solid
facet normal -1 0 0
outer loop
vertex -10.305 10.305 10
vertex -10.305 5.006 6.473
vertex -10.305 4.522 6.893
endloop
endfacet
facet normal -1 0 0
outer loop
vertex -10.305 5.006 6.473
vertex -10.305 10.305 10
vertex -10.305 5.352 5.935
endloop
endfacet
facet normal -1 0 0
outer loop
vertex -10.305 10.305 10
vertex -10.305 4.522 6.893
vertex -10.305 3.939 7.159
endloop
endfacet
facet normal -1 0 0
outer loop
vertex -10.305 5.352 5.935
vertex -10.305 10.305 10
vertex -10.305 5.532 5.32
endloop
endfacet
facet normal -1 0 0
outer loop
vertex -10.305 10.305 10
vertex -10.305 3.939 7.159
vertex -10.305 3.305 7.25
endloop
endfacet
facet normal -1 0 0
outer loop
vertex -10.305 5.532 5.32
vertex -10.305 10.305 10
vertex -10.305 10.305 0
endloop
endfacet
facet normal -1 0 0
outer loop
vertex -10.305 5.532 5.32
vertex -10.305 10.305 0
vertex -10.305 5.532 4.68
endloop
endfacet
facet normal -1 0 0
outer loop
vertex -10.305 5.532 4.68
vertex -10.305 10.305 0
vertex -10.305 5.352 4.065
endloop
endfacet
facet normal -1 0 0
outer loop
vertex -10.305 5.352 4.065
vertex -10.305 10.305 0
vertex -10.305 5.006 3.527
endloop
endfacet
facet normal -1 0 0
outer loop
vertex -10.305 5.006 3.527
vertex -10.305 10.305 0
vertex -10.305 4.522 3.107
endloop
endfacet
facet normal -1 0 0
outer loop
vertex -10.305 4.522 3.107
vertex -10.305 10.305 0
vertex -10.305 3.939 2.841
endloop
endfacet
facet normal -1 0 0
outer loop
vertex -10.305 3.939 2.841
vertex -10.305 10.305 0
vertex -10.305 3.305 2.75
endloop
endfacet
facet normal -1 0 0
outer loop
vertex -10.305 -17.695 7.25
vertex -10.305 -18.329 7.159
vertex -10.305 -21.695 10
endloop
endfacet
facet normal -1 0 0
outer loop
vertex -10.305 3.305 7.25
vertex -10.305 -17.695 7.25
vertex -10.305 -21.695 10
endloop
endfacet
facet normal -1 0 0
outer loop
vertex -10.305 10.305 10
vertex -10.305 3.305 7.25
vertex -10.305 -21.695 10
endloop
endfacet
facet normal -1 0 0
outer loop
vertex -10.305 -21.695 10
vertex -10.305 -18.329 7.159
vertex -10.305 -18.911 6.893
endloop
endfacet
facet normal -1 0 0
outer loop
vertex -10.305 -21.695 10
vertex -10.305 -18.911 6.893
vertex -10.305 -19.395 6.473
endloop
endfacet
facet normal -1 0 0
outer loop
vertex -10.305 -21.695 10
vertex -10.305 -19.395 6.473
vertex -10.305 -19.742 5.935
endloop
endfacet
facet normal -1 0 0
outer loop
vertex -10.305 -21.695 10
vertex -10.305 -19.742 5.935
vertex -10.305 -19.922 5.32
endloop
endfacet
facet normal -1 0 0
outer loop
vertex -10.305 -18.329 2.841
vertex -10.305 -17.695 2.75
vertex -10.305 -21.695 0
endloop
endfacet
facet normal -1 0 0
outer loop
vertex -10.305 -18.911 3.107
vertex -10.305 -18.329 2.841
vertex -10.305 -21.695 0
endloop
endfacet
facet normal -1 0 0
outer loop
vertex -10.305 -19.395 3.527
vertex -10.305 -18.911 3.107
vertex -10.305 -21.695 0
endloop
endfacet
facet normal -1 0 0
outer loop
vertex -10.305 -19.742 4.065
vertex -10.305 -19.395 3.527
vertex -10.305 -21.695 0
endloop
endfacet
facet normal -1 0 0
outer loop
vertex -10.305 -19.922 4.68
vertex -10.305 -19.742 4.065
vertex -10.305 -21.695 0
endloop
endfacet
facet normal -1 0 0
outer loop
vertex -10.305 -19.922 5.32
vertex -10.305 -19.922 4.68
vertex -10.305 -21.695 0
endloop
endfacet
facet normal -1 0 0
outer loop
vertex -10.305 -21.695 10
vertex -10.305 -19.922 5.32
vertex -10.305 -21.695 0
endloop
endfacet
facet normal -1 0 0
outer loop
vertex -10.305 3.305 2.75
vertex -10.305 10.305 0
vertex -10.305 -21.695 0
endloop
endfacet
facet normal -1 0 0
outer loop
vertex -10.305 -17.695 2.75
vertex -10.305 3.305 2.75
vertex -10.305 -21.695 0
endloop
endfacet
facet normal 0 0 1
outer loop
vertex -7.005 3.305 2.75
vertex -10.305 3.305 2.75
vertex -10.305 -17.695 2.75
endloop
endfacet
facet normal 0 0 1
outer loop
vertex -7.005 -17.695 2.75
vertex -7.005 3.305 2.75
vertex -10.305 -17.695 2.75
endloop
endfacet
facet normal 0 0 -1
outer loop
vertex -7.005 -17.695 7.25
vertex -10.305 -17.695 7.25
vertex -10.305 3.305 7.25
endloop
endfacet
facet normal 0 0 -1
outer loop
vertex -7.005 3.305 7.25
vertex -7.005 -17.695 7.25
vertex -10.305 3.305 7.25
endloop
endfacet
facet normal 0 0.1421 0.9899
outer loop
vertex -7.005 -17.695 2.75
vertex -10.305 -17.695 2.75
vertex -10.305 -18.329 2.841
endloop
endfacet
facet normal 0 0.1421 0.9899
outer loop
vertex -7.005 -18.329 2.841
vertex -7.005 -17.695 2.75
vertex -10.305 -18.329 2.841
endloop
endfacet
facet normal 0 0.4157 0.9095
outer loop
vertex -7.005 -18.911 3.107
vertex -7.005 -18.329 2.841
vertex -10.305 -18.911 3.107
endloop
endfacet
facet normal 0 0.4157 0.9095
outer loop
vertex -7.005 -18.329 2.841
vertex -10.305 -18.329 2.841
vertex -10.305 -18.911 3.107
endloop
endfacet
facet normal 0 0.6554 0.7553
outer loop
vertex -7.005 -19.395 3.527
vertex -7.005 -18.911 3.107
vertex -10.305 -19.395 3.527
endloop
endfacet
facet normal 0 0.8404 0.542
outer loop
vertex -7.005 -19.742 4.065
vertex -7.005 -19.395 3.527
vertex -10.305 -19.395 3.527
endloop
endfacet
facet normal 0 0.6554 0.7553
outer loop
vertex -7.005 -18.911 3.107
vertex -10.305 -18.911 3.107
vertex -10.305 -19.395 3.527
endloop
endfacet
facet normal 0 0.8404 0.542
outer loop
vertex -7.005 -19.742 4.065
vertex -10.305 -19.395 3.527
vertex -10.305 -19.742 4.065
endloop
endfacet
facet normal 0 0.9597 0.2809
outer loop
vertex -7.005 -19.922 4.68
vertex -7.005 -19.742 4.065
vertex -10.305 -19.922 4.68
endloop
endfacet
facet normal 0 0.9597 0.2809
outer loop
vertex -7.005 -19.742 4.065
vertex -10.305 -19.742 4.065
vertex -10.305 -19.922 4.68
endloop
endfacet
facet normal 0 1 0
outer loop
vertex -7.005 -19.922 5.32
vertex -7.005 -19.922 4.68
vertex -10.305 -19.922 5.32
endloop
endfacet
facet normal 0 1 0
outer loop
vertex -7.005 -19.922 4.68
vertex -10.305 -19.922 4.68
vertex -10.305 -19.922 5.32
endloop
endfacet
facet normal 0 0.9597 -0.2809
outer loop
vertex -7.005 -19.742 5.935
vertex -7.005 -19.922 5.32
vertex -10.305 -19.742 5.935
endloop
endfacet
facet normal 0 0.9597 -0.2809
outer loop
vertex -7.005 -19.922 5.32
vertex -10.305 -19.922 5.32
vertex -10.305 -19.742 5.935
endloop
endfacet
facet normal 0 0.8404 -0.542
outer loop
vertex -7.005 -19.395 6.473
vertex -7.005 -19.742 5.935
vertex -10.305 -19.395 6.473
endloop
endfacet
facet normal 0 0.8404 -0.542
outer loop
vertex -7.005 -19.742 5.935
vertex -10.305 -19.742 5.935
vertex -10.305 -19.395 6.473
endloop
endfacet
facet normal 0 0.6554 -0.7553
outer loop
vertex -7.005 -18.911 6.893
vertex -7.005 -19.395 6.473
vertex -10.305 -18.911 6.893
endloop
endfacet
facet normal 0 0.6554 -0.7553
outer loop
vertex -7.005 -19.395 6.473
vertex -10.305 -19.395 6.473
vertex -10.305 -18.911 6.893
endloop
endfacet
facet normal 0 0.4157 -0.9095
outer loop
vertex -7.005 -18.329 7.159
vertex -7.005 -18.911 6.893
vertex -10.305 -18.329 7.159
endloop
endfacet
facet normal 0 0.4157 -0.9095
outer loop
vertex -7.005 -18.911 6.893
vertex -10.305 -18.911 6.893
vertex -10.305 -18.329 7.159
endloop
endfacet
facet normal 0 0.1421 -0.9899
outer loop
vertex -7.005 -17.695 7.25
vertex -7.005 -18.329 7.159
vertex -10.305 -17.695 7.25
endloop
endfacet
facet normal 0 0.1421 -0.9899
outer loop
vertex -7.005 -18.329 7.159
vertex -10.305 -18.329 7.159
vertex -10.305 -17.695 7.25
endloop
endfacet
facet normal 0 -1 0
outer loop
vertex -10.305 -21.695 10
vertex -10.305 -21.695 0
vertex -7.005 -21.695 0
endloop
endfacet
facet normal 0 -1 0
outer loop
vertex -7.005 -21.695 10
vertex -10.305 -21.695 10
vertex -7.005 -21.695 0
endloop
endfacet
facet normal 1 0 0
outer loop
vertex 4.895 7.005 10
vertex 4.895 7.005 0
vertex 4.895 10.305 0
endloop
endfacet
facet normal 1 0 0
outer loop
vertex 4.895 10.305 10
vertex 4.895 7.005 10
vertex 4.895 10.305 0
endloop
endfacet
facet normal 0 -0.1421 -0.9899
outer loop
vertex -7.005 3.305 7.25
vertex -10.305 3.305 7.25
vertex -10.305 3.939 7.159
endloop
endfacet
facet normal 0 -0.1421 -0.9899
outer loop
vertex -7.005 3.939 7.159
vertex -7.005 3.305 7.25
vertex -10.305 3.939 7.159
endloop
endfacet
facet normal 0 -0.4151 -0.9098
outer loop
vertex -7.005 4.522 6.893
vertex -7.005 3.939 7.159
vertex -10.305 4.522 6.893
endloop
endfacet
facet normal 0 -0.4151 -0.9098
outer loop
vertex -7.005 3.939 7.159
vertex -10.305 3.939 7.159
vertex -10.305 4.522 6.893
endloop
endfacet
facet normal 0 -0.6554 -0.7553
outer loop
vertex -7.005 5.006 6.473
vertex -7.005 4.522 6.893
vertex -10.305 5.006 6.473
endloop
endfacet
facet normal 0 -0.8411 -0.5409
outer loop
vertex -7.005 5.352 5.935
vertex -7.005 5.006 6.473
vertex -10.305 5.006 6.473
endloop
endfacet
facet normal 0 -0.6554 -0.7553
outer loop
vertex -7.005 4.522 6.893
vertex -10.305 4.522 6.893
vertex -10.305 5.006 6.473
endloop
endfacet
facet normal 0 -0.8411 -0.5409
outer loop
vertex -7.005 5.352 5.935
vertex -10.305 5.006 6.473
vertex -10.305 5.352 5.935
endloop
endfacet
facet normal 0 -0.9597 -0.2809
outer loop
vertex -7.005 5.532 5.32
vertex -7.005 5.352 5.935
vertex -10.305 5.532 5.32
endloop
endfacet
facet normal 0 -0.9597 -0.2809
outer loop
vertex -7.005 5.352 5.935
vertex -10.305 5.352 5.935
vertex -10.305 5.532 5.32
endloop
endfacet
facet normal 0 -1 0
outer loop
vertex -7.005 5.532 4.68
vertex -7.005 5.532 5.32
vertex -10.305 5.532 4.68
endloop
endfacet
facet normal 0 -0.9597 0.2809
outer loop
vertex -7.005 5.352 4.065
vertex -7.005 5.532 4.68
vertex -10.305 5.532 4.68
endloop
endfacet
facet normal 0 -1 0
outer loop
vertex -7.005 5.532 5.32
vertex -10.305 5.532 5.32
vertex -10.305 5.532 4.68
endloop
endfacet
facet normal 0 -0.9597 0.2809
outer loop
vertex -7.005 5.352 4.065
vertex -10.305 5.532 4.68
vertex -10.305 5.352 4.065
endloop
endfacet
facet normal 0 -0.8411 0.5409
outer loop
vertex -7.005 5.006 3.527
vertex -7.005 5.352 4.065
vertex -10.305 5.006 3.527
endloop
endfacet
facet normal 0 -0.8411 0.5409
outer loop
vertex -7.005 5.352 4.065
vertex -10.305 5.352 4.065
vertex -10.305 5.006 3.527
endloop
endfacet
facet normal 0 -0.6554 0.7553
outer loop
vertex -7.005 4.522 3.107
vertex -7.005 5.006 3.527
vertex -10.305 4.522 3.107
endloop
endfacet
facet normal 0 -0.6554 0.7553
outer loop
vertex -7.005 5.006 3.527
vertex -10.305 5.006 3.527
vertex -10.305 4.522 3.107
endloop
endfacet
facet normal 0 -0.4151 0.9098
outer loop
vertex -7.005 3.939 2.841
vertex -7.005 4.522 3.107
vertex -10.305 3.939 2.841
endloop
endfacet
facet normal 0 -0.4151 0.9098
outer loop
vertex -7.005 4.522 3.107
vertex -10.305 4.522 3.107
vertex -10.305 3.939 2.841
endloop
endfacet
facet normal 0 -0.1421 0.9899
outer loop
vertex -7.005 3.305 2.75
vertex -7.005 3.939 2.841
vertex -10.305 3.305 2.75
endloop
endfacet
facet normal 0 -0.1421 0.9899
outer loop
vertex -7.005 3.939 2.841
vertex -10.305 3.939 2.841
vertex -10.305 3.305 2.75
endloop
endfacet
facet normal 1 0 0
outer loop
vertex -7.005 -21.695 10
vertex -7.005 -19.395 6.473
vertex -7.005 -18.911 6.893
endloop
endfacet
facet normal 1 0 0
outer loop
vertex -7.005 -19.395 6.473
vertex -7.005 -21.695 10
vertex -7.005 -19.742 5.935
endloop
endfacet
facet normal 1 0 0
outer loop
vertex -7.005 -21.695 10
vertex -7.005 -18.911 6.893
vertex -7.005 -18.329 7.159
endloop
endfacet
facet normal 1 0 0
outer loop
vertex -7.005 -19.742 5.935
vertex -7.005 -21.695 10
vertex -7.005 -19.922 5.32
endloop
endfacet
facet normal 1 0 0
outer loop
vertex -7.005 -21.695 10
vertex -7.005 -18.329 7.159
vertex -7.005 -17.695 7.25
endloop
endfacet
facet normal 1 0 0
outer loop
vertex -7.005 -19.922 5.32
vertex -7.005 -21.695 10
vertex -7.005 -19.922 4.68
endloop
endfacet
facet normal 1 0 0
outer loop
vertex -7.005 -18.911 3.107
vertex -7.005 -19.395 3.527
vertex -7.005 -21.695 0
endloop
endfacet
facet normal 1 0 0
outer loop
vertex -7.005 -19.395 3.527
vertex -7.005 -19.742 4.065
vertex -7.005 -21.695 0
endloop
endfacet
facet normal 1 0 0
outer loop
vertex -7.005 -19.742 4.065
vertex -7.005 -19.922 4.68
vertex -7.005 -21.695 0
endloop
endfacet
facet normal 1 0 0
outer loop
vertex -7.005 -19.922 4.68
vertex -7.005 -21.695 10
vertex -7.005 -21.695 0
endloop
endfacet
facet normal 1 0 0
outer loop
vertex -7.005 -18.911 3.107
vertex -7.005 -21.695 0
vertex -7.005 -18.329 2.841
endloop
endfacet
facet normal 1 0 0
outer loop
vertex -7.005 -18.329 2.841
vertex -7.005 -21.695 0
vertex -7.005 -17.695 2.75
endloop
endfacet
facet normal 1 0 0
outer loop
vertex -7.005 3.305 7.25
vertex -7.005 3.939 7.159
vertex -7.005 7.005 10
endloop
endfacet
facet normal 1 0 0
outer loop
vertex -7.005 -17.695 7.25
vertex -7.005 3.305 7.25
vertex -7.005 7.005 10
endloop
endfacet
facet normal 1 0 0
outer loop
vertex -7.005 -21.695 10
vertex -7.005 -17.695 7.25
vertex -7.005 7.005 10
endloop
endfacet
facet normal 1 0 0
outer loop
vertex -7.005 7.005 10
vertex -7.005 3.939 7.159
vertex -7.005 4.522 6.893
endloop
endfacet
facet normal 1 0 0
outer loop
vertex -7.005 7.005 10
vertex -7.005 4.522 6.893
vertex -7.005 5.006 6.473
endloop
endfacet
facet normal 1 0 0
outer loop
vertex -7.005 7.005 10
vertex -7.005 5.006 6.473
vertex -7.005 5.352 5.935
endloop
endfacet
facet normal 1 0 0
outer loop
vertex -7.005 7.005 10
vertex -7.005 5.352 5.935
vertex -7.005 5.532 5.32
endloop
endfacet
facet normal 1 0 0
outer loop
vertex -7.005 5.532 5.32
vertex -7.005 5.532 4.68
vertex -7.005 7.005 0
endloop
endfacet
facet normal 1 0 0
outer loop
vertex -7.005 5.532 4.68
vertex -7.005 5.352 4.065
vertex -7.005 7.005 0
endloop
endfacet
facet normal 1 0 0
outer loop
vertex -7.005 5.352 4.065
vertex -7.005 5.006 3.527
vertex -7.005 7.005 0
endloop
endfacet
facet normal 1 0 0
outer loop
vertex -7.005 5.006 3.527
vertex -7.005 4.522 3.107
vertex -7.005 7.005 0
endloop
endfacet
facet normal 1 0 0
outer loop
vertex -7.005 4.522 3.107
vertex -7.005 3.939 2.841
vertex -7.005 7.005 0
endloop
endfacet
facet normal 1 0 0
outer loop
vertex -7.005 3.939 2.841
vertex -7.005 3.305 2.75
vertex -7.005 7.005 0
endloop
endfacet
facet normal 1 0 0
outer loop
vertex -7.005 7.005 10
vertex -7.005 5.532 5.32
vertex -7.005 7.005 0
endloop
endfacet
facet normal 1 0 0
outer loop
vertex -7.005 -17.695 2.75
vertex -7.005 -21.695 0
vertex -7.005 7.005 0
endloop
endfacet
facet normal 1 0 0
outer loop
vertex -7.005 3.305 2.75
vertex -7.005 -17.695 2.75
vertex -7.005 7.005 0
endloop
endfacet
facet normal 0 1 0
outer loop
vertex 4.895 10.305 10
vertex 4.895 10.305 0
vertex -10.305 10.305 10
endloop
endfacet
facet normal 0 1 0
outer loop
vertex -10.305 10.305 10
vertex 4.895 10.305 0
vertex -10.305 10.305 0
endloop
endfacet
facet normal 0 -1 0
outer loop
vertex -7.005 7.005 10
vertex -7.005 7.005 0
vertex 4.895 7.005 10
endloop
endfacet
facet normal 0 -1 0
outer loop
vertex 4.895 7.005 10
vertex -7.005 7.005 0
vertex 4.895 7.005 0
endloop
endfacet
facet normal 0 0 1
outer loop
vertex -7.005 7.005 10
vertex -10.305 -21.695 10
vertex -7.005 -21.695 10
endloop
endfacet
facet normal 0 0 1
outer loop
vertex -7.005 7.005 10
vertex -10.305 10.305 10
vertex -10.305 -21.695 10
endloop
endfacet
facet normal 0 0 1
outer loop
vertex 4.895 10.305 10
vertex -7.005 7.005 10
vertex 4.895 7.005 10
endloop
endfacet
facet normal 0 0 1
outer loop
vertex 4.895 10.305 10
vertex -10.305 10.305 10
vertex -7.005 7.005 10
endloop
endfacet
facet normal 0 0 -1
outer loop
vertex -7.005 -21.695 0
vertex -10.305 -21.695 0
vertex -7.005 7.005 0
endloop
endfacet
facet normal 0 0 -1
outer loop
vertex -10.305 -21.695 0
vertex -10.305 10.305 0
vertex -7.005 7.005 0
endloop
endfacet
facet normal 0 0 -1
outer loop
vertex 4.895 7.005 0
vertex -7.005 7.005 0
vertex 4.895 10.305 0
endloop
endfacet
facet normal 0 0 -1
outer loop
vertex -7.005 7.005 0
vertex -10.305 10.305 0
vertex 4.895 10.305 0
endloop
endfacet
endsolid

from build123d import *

# Parameters (mm, degrees)
BOSS_EXTRUDE1_DEPTH = 10
CUT_EXTRUDE1_DEPTH  = 6


with BuildPart() as part:
    # Sketch1 → Boss-Extrude1 (new body)
    with BuildSketch(Plane.XY):
        Polygon((-10.305084746, -21.694915254), (-7.005084746, -21.694915254), (-7.005084746, 7.005084746), (4.894915254, 7.005084746), (4.894915254, 10.305084746), (-10.305084746, 10.305084746), align=None)
    extrude(amount=BOSS_EXTRUDE1_DEPTH)

    # Sketch2 → Cut-Extrude1 (cut)
    with BuildSketch(Plane.ZY.offset(10.305084746)):
        with BuildLine():
            Line((2.75, 3.305084746), (2.75, -17.694915254))
            ThreePointArc((2.75, -17.694915254), (5, -19.944915254), (7.25, -17.694915254))
            Line((7.25, -17.694915254), (7.25, 3.305084746))
            ThreePointArc((7.25, 3.305084746), (5, 5.555084746), (2.75, 3.305084746))
        make_face()
    extrude(amount=-CUT_EXTRUDE1_DEPTH, mode=Mode.SUBTRACT)


solid = part.part
